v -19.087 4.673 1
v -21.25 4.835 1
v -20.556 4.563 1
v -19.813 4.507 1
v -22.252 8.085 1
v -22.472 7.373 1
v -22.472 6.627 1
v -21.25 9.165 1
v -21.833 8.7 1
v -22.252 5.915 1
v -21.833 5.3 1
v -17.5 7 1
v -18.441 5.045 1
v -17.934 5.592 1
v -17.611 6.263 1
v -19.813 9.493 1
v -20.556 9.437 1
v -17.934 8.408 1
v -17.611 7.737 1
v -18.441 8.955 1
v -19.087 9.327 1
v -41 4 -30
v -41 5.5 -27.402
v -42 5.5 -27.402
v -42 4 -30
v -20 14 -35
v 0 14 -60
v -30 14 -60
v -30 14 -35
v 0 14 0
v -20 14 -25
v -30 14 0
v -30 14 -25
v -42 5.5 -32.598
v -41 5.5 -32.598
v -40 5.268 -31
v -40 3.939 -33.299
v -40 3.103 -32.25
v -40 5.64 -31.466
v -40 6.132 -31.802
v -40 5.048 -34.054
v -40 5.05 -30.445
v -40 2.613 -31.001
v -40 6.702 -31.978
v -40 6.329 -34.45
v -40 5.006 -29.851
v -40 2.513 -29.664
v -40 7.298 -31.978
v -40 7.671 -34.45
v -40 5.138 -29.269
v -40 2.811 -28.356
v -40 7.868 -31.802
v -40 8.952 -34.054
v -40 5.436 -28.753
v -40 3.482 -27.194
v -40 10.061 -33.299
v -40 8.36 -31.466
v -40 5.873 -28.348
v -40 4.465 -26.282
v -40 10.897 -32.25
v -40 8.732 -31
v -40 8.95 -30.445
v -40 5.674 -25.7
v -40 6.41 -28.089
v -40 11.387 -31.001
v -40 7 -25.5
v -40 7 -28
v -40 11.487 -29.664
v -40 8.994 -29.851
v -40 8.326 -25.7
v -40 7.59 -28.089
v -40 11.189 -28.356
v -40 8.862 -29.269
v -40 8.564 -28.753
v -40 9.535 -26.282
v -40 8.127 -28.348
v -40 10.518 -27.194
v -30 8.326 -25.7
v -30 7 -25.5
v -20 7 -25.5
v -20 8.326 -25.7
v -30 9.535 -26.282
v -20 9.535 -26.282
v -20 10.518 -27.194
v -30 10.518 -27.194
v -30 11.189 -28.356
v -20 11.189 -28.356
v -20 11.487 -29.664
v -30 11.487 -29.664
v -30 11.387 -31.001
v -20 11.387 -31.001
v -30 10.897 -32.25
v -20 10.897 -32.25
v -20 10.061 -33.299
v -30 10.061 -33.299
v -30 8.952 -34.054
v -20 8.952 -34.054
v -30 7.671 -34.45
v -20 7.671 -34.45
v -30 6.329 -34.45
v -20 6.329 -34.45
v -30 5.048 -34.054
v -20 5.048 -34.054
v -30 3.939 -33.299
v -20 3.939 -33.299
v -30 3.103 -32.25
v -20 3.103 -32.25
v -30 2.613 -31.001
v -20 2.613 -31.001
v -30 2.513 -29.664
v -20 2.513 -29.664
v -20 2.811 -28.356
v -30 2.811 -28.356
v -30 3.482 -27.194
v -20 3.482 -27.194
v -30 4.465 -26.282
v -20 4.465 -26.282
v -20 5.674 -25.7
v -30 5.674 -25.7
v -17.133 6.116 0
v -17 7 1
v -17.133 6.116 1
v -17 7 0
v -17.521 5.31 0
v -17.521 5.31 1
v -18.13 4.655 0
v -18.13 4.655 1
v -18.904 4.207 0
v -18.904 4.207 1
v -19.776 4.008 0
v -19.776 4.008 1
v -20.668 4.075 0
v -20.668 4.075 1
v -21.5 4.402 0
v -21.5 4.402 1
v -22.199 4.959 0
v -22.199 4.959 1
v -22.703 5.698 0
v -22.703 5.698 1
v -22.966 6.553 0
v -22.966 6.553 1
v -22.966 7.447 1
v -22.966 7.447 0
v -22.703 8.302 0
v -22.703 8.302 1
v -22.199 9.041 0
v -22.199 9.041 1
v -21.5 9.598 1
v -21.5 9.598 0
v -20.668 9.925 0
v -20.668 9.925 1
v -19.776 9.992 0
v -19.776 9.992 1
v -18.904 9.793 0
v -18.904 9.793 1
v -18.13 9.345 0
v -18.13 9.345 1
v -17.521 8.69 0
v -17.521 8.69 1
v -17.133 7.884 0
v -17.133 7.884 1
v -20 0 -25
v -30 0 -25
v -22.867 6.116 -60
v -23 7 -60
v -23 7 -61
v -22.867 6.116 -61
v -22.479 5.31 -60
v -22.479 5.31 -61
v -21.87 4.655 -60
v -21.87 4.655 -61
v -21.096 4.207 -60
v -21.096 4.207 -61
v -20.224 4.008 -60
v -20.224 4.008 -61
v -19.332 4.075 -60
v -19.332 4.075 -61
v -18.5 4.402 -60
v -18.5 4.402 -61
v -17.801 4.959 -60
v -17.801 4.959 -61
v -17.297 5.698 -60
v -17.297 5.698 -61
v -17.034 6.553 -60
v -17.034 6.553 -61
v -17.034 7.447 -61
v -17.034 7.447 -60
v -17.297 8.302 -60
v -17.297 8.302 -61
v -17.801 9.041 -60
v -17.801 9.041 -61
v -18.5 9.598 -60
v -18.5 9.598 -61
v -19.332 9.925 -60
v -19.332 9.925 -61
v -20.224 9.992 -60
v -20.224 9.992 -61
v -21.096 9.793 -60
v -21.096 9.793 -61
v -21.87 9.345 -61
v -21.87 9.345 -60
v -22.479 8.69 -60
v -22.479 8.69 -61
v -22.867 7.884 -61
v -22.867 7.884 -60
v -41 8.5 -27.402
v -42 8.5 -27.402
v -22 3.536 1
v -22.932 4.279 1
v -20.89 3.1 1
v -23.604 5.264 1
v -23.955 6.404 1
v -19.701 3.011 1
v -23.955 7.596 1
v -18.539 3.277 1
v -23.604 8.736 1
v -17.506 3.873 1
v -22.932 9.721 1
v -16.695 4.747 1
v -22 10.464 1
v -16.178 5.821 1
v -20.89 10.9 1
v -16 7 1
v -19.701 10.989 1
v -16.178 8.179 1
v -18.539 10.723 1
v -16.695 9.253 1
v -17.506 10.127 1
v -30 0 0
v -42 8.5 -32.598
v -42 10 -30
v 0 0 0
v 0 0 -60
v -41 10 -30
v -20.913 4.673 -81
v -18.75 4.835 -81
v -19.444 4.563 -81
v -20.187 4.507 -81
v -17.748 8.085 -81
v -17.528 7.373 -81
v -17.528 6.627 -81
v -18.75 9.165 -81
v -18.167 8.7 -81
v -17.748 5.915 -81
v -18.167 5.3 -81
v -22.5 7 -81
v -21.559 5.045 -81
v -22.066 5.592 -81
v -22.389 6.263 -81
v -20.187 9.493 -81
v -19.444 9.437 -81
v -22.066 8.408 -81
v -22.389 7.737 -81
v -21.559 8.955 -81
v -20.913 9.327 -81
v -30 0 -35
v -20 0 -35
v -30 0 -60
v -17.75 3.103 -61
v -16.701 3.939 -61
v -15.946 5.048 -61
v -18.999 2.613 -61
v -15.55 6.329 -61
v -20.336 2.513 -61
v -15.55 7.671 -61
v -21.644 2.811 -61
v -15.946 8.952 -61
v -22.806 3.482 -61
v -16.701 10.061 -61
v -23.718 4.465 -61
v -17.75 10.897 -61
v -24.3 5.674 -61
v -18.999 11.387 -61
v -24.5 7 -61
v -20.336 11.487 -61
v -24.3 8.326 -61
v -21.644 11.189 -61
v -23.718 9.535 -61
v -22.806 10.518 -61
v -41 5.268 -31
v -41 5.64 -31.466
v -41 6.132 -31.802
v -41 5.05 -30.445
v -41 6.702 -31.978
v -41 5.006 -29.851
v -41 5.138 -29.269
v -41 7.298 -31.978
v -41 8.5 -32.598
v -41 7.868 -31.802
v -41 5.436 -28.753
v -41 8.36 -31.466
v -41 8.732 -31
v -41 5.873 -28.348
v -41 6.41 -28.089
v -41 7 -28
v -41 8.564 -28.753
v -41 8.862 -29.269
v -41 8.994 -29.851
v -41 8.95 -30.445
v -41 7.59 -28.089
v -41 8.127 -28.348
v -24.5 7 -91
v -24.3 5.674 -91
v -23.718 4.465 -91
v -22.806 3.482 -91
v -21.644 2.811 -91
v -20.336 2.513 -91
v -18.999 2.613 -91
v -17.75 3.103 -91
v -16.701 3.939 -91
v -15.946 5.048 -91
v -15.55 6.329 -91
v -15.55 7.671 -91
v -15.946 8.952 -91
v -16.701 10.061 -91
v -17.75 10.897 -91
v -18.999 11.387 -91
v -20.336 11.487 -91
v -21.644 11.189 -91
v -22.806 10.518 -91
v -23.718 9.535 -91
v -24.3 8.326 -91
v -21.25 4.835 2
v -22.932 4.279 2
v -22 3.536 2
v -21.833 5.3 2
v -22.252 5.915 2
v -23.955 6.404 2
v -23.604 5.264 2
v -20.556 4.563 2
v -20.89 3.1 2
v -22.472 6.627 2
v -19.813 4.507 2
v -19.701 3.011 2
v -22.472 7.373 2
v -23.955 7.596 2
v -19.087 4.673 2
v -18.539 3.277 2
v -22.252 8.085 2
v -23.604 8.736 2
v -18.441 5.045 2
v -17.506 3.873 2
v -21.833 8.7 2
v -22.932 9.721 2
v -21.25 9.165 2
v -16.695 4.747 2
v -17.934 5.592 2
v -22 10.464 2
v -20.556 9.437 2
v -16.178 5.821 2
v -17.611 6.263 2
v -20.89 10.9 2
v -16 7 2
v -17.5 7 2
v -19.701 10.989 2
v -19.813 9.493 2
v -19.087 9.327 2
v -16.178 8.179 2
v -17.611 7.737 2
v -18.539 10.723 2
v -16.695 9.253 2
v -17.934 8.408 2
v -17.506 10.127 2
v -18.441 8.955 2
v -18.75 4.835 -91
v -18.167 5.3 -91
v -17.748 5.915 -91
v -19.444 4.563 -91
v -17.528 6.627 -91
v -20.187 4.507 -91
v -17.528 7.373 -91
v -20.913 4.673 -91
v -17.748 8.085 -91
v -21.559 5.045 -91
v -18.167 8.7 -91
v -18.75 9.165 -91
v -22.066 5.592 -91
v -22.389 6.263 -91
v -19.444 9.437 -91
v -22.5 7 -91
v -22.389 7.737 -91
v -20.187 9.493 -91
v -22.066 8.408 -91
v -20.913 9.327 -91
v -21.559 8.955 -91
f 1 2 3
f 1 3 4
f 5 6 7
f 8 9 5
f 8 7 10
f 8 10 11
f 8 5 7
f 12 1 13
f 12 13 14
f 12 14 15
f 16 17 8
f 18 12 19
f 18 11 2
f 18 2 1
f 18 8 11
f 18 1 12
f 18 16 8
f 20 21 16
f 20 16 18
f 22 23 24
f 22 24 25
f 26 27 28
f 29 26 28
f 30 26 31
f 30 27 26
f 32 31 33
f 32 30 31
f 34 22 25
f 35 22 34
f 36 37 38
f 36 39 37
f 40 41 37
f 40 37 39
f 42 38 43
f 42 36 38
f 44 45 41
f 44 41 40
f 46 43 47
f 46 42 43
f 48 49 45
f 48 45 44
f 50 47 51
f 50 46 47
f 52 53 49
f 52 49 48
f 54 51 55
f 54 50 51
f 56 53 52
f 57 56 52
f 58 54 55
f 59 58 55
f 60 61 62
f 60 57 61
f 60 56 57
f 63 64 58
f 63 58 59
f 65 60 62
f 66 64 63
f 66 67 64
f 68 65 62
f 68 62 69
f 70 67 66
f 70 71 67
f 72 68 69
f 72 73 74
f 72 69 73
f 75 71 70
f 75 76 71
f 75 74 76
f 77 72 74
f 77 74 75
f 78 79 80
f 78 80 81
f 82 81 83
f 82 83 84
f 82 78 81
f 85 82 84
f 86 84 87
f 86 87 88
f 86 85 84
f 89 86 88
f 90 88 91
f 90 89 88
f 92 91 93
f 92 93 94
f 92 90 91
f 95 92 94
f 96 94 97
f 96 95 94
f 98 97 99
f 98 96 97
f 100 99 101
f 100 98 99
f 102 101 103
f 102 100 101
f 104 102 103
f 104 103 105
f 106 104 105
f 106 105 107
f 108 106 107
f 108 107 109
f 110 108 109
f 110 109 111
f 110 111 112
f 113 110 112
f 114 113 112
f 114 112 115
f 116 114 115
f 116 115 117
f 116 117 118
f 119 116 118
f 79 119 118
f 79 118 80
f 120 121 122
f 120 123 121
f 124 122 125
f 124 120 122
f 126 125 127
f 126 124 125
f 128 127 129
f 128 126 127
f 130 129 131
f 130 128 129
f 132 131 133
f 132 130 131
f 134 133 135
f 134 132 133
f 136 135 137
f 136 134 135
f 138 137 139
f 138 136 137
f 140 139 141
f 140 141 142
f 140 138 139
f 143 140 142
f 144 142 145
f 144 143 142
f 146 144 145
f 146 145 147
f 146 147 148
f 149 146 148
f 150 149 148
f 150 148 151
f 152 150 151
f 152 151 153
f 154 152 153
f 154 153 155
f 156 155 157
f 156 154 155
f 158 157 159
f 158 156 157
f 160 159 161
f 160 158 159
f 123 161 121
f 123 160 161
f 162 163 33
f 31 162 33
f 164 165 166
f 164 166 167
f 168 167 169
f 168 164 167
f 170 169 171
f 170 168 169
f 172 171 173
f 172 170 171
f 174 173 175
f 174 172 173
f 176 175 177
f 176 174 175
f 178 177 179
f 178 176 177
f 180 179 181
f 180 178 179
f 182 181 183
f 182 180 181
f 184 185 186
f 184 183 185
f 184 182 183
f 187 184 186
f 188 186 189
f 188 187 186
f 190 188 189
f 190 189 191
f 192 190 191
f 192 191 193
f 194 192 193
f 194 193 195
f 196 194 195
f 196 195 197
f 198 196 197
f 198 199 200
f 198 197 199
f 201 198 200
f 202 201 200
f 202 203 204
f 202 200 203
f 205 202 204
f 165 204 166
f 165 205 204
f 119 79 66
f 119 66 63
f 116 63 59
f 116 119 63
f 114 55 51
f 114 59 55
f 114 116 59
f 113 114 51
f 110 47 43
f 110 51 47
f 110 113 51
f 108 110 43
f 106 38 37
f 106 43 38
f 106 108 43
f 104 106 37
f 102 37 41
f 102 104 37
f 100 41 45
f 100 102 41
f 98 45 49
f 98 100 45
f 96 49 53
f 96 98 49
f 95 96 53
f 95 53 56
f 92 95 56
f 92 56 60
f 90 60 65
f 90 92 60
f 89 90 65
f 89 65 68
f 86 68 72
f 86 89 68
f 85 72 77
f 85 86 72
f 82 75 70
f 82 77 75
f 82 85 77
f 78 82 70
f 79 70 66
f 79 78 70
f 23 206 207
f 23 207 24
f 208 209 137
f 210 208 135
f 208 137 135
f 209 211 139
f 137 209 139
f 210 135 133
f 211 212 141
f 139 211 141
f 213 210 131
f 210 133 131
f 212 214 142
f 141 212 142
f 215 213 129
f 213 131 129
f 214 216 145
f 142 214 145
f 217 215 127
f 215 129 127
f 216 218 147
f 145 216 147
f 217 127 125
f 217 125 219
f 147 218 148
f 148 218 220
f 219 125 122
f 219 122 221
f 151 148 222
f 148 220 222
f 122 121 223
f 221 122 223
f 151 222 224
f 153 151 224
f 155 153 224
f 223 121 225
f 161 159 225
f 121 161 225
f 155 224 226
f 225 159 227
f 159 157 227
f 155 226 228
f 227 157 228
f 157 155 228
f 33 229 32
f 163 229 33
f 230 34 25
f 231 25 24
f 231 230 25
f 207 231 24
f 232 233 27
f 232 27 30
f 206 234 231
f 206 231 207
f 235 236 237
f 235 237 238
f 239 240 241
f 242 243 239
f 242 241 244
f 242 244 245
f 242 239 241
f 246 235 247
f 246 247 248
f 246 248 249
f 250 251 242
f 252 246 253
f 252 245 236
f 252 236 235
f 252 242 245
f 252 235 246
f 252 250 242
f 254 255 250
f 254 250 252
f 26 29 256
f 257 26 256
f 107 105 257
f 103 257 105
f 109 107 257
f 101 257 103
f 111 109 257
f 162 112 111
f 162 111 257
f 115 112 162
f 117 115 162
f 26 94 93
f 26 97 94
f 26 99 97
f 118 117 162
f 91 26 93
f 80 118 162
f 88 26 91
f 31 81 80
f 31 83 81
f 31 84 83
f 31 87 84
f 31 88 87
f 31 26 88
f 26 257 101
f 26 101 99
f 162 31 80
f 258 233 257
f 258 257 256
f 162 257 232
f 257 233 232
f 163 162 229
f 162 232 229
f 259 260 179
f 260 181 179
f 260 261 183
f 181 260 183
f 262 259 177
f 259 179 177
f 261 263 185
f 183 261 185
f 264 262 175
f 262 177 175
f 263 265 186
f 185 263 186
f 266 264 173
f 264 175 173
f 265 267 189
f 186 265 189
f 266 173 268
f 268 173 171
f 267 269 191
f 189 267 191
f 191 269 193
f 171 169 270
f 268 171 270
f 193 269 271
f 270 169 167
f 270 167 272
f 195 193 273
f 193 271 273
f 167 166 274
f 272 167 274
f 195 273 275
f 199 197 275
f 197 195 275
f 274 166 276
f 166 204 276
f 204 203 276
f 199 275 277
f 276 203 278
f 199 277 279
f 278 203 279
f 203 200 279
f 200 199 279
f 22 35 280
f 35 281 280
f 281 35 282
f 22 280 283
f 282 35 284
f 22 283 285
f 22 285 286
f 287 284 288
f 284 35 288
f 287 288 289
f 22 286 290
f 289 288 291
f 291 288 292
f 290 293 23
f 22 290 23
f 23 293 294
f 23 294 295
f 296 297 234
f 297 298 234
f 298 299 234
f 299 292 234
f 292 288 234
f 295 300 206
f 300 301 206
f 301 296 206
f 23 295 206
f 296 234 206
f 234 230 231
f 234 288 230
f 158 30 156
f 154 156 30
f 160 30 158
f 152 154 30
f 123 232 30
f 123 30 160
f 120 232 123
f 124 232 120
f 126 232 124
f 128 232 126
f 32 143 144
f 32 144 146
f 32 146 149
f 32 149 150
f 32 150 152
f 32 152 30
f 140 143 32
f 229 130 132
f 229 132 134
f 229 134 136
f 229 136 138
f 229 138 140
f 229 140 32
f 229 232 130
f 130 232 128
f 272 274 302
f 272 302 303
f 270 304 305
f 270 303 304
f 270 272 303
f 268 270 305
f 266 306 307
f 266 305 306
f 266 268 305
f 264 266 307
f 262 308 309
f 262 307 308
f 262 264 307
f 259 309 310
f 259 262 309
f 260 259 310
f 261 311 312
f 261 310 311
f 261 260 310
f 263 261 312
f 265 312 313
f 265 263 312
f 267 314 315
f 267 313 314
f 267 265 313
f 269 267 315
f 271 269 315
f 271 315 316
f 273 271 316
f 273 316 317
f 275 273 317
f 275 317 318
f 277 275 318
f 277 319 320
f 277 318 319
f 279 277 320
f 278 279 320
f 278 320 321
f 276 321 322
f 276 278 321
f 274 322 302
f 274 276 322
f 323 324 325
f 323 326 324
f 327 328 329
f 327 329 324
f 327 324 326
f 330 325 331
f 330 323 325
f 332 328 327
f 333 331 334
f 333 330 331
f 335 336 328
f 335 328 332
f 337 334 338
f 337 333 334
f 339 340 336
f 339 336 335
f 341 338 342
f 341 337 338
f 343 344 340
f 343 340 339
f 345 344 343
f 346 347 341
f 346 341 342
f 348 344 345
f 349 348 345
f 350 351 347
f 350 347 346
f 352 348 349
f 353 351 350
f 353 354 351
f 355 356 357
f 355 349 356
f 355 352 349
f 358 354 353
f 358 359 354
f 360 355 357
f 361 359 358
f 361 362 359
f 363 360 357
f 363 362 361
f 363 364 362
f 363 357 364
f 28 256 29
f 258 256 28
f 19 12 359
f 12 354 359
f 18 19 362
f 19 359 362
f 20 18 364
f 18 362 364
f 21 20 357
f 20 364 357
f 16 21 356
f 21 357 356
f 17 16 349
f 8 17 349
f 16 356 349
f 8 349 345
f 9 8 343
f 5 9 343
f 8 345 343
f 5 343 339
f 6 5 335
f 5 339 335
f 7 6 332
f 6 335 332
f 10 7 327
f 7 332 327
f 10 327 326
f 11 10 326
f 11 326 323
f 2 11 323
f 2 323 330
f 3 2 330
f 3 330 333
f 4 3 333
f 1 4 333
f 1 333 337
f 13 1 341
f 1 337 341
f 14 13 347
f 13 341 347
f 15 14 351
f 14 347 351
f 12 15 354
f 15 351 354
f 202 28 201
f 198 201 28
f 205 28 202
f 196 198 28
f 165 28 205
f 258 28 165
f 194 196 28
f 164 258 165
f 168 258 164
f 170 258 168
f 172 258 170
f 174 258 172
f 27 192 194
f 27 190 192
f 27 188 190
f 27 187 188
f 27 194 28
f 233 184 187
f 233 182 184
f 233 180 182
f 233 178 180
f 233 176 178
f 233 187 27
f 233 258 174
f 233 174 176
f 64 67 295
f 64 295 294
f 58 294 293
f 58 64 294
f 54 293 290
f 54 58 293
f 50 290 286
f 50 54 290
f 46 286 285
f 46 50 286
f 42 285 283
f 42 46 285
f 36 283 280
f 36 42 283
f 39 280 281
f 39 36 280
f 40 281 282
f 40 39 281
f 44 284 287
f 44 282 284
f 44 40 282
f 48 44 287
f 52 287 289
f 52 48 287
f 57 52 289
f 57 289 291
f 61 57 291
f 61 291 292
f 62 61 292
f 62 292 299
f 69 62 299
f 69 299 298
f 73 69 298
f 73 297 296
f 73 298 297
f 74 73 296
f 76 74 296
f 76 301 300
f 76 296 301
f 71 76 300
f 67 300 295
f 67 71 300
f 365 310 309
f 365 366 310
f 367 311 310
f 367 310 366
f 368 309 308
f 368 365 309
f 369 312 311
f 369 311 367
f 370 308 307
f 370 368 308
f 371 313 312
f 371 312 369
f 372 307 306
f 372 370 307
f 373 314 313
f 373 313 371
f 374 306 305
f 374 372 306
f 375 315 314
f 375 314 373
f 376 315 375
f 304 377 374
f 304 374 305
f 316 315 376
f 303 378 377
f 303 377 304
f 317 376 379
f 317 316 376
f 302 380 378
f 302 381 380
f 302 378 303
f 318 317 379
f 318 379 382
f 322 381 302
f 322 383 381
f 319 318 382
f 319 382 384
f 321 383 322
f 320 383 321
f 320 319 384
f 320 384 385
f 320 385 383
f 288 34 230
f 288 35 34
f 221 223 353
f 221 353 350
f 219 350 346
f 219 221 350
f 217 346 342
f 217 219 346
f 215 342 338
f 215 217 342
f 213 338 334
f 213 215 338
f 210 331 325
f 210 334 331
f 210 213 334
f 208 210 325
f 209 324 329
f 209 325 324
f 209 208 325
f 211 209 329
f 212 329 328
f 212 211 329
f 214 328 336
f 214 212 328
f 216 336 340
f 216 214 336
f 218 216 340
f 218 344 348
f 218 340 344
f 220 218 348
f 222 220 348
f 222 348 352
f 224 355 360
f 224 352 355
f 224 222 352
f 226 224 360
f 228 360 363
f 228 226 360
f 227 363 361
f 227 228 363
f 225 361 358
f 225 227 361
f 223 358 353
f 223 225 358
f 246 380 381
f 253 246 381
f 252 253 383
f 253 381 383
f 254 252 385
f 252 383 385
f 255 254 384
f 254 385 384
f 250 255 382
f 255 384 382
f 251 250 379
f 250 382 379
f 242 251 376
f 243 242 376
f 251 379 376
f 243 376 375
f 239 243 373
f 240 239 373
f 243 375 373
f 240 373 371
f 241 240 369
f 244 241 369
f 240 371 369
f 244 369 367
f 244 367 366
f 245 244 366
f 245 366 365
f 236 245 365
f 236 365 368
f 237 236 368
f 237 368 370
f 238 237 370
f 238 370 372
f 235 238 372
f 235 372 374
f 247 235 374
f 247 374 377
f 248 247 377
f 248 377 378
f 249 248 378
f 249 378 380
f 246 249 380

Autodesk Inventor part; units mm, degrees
ref_plane "YZ Plane" through (0, 0, 0) normal (1, 0, 0) x (0, 1, 0)
ref_plane "XZ Plane" through (0, 0, 0) normal (0, 1, 0) x (-1, 0, 0)
ref_plane "XY Plane" through (0, 0, 0) normal (0, 0, 1) x (1, 0, 0)
sketch "Sketch1" plane through (0, 0, 0) normal (0, 1, 0) x (-1, 0, 0)
  line L0 (0, 0) -> (30, 0)
  line L1 (30, 0) -> (30, -60)
  line L2 (30, -60) -> (0, -60)
  line L3 (0, -60) -> (0, 0)
  dimension "d0" = 30
  dimension "d1" = 60
extrude "Extrusion1" add sketch "Sketch1" along normal blind 14
sketch "Sketch2" plane through (-30, 0, 0) normal (0, 0, 1) x (1, 0, 0)
  line L0 (0, 0) -> (0, 14) projected
  line L1 (0, 7) -> (10, 7)
  circle A0 centre (10, 7) radius 3
  point P0 (30, 0)
  dimension "d4" = 10
  dimension "d5" = 6
extrude "Extrusion2" add sketch "Sketch2" along normal blind 1
sketch "Sketch3" plane through (-20, 7, 1) normal (0, 0, 1) x (1, 0, 0)
  circle A0 centre (0, 0) radius 4
  point P0 (20, -7)
  dimension "d8" = 8
extrude "Extrusion3" add sketch "Sketch3" along normal blind 1
sketch "Sketch4" plane through (-20, 7, 2) normal (0, 0, 1) x (1, 0, 0)
  circle A0 centre (0, 0) radius 2.5
  point P0 (20, -7)
  dimension "d11" = 5
extrude "Extrusion4" cut sketch "Sketch4" against normal blind 1
sketch "Sketch5" plane through (0, 0, -60) normal (0, 0, -1) x (-1, 0, 0)
  line L0 (30, 0) -> (30, 14) projected
  line L1 (30, 7) -> (20, 7)
  circle A0 centre (20, 7) radius 3
  point P0 (0, 0)
  dimension "d14" = 10
  dimension "d15" = 6
extrude "Extrusion5" add sketch "Sketch5" along normal blind 1
sketch "Sketch6" plane through (-20, 7, -61) normal (0, 0, -1) x (-1, 0, 0)
  circle A0 centre (0, 0) radius 4.5
  point P0 (-20, -7)
  dimension "d18" = 9
extrude "Extrusion6" add sketch "Sketch6" along normal blind 30
sketch "Sketch7" plane through (-30, 0, -60) normal (-1, 0, 0) x (0, 0, 1)
  line L0 (60, 0) -> (30, 0)
  line L1 (0, 0) -> (60, 0) projected
  line L2 (30, 0) -> (35, 0)
  line L3 (35, 0) -> (35, 14)
  line L4 (0, 14) -> (60, 14) projected
  line L5 (35, 14) -> (25, 14)
  line L6 (25, 14) -> (25, 0)
  line L7 (25, 0) -> (30, 0)
  circle A0 centre (30, 7) radius 4.5
  dimension "d21" = 5
  dimension "d22" = 10
  dimension "d23" = 9
extrude "Extrusion7" cut sketch "Sketch7" against normal blind 10
sketch "Sketch8" plane through (-30, 7, -30) normal (-1, 0, 0) x (0, 0, 1)
  circle A0 centre (0, 0) radius 4.5
  point P0 (30, -7)
extrude "Extrusion8" add sketch "Sketch8" along normal blind 10
sketch "Sketch9" plane through (-40, 7, -30) normal (-1, 0, 0) x (0, 0, 1)
  circle A0 centre (0, 0) radius 2
  point P0 (30, -7)
  dimension "d28" = 4
extrude "Extrusion9" add sketch "Sketch9" along normal blind 1
sketch "Sketch10" plane through (-41, 7, -30) normal (-1, 0, 0) x (0, 0, 1)
  circle A0 centre (0, 0) radius 3
  line L0 (0, -3) -> (-2.5981, -1.5)
  line L1 (-2.5981, -1.5) -> (-2.5981, 1.5)
  line L2 (-2.5981, 1.5) -> (0, 3)
  line L3 (0, 3) -> (2.5981, 1.5)
  line L4 (2.5981, 1.5) -> (2.5981, -1.5)
  line L5 (2.5981, -1.5) -> (0, -3)
  point P0 (30, -7)
  dimension "d31" = 6
extrude "Extrusion10" add sketch "Sketch10" along normal blind 1 contours L4 L5 L0 L1 L2 L3
sketch "Sketch11" plane through (-20, 7, -91) normal (0, 0, -1) x (-1, 0, 0)
  line L0 (0, -4.5) -> (0, 4.5) projected
  circle A0 centre (0, 0) radius 2.5
  point P0 (-20, -7)
  dimension "d34" = 5
extrude "Extrusion11" cut sketch "Sketch11" against normal blind 10
properties part number "vacuumGenerator"
